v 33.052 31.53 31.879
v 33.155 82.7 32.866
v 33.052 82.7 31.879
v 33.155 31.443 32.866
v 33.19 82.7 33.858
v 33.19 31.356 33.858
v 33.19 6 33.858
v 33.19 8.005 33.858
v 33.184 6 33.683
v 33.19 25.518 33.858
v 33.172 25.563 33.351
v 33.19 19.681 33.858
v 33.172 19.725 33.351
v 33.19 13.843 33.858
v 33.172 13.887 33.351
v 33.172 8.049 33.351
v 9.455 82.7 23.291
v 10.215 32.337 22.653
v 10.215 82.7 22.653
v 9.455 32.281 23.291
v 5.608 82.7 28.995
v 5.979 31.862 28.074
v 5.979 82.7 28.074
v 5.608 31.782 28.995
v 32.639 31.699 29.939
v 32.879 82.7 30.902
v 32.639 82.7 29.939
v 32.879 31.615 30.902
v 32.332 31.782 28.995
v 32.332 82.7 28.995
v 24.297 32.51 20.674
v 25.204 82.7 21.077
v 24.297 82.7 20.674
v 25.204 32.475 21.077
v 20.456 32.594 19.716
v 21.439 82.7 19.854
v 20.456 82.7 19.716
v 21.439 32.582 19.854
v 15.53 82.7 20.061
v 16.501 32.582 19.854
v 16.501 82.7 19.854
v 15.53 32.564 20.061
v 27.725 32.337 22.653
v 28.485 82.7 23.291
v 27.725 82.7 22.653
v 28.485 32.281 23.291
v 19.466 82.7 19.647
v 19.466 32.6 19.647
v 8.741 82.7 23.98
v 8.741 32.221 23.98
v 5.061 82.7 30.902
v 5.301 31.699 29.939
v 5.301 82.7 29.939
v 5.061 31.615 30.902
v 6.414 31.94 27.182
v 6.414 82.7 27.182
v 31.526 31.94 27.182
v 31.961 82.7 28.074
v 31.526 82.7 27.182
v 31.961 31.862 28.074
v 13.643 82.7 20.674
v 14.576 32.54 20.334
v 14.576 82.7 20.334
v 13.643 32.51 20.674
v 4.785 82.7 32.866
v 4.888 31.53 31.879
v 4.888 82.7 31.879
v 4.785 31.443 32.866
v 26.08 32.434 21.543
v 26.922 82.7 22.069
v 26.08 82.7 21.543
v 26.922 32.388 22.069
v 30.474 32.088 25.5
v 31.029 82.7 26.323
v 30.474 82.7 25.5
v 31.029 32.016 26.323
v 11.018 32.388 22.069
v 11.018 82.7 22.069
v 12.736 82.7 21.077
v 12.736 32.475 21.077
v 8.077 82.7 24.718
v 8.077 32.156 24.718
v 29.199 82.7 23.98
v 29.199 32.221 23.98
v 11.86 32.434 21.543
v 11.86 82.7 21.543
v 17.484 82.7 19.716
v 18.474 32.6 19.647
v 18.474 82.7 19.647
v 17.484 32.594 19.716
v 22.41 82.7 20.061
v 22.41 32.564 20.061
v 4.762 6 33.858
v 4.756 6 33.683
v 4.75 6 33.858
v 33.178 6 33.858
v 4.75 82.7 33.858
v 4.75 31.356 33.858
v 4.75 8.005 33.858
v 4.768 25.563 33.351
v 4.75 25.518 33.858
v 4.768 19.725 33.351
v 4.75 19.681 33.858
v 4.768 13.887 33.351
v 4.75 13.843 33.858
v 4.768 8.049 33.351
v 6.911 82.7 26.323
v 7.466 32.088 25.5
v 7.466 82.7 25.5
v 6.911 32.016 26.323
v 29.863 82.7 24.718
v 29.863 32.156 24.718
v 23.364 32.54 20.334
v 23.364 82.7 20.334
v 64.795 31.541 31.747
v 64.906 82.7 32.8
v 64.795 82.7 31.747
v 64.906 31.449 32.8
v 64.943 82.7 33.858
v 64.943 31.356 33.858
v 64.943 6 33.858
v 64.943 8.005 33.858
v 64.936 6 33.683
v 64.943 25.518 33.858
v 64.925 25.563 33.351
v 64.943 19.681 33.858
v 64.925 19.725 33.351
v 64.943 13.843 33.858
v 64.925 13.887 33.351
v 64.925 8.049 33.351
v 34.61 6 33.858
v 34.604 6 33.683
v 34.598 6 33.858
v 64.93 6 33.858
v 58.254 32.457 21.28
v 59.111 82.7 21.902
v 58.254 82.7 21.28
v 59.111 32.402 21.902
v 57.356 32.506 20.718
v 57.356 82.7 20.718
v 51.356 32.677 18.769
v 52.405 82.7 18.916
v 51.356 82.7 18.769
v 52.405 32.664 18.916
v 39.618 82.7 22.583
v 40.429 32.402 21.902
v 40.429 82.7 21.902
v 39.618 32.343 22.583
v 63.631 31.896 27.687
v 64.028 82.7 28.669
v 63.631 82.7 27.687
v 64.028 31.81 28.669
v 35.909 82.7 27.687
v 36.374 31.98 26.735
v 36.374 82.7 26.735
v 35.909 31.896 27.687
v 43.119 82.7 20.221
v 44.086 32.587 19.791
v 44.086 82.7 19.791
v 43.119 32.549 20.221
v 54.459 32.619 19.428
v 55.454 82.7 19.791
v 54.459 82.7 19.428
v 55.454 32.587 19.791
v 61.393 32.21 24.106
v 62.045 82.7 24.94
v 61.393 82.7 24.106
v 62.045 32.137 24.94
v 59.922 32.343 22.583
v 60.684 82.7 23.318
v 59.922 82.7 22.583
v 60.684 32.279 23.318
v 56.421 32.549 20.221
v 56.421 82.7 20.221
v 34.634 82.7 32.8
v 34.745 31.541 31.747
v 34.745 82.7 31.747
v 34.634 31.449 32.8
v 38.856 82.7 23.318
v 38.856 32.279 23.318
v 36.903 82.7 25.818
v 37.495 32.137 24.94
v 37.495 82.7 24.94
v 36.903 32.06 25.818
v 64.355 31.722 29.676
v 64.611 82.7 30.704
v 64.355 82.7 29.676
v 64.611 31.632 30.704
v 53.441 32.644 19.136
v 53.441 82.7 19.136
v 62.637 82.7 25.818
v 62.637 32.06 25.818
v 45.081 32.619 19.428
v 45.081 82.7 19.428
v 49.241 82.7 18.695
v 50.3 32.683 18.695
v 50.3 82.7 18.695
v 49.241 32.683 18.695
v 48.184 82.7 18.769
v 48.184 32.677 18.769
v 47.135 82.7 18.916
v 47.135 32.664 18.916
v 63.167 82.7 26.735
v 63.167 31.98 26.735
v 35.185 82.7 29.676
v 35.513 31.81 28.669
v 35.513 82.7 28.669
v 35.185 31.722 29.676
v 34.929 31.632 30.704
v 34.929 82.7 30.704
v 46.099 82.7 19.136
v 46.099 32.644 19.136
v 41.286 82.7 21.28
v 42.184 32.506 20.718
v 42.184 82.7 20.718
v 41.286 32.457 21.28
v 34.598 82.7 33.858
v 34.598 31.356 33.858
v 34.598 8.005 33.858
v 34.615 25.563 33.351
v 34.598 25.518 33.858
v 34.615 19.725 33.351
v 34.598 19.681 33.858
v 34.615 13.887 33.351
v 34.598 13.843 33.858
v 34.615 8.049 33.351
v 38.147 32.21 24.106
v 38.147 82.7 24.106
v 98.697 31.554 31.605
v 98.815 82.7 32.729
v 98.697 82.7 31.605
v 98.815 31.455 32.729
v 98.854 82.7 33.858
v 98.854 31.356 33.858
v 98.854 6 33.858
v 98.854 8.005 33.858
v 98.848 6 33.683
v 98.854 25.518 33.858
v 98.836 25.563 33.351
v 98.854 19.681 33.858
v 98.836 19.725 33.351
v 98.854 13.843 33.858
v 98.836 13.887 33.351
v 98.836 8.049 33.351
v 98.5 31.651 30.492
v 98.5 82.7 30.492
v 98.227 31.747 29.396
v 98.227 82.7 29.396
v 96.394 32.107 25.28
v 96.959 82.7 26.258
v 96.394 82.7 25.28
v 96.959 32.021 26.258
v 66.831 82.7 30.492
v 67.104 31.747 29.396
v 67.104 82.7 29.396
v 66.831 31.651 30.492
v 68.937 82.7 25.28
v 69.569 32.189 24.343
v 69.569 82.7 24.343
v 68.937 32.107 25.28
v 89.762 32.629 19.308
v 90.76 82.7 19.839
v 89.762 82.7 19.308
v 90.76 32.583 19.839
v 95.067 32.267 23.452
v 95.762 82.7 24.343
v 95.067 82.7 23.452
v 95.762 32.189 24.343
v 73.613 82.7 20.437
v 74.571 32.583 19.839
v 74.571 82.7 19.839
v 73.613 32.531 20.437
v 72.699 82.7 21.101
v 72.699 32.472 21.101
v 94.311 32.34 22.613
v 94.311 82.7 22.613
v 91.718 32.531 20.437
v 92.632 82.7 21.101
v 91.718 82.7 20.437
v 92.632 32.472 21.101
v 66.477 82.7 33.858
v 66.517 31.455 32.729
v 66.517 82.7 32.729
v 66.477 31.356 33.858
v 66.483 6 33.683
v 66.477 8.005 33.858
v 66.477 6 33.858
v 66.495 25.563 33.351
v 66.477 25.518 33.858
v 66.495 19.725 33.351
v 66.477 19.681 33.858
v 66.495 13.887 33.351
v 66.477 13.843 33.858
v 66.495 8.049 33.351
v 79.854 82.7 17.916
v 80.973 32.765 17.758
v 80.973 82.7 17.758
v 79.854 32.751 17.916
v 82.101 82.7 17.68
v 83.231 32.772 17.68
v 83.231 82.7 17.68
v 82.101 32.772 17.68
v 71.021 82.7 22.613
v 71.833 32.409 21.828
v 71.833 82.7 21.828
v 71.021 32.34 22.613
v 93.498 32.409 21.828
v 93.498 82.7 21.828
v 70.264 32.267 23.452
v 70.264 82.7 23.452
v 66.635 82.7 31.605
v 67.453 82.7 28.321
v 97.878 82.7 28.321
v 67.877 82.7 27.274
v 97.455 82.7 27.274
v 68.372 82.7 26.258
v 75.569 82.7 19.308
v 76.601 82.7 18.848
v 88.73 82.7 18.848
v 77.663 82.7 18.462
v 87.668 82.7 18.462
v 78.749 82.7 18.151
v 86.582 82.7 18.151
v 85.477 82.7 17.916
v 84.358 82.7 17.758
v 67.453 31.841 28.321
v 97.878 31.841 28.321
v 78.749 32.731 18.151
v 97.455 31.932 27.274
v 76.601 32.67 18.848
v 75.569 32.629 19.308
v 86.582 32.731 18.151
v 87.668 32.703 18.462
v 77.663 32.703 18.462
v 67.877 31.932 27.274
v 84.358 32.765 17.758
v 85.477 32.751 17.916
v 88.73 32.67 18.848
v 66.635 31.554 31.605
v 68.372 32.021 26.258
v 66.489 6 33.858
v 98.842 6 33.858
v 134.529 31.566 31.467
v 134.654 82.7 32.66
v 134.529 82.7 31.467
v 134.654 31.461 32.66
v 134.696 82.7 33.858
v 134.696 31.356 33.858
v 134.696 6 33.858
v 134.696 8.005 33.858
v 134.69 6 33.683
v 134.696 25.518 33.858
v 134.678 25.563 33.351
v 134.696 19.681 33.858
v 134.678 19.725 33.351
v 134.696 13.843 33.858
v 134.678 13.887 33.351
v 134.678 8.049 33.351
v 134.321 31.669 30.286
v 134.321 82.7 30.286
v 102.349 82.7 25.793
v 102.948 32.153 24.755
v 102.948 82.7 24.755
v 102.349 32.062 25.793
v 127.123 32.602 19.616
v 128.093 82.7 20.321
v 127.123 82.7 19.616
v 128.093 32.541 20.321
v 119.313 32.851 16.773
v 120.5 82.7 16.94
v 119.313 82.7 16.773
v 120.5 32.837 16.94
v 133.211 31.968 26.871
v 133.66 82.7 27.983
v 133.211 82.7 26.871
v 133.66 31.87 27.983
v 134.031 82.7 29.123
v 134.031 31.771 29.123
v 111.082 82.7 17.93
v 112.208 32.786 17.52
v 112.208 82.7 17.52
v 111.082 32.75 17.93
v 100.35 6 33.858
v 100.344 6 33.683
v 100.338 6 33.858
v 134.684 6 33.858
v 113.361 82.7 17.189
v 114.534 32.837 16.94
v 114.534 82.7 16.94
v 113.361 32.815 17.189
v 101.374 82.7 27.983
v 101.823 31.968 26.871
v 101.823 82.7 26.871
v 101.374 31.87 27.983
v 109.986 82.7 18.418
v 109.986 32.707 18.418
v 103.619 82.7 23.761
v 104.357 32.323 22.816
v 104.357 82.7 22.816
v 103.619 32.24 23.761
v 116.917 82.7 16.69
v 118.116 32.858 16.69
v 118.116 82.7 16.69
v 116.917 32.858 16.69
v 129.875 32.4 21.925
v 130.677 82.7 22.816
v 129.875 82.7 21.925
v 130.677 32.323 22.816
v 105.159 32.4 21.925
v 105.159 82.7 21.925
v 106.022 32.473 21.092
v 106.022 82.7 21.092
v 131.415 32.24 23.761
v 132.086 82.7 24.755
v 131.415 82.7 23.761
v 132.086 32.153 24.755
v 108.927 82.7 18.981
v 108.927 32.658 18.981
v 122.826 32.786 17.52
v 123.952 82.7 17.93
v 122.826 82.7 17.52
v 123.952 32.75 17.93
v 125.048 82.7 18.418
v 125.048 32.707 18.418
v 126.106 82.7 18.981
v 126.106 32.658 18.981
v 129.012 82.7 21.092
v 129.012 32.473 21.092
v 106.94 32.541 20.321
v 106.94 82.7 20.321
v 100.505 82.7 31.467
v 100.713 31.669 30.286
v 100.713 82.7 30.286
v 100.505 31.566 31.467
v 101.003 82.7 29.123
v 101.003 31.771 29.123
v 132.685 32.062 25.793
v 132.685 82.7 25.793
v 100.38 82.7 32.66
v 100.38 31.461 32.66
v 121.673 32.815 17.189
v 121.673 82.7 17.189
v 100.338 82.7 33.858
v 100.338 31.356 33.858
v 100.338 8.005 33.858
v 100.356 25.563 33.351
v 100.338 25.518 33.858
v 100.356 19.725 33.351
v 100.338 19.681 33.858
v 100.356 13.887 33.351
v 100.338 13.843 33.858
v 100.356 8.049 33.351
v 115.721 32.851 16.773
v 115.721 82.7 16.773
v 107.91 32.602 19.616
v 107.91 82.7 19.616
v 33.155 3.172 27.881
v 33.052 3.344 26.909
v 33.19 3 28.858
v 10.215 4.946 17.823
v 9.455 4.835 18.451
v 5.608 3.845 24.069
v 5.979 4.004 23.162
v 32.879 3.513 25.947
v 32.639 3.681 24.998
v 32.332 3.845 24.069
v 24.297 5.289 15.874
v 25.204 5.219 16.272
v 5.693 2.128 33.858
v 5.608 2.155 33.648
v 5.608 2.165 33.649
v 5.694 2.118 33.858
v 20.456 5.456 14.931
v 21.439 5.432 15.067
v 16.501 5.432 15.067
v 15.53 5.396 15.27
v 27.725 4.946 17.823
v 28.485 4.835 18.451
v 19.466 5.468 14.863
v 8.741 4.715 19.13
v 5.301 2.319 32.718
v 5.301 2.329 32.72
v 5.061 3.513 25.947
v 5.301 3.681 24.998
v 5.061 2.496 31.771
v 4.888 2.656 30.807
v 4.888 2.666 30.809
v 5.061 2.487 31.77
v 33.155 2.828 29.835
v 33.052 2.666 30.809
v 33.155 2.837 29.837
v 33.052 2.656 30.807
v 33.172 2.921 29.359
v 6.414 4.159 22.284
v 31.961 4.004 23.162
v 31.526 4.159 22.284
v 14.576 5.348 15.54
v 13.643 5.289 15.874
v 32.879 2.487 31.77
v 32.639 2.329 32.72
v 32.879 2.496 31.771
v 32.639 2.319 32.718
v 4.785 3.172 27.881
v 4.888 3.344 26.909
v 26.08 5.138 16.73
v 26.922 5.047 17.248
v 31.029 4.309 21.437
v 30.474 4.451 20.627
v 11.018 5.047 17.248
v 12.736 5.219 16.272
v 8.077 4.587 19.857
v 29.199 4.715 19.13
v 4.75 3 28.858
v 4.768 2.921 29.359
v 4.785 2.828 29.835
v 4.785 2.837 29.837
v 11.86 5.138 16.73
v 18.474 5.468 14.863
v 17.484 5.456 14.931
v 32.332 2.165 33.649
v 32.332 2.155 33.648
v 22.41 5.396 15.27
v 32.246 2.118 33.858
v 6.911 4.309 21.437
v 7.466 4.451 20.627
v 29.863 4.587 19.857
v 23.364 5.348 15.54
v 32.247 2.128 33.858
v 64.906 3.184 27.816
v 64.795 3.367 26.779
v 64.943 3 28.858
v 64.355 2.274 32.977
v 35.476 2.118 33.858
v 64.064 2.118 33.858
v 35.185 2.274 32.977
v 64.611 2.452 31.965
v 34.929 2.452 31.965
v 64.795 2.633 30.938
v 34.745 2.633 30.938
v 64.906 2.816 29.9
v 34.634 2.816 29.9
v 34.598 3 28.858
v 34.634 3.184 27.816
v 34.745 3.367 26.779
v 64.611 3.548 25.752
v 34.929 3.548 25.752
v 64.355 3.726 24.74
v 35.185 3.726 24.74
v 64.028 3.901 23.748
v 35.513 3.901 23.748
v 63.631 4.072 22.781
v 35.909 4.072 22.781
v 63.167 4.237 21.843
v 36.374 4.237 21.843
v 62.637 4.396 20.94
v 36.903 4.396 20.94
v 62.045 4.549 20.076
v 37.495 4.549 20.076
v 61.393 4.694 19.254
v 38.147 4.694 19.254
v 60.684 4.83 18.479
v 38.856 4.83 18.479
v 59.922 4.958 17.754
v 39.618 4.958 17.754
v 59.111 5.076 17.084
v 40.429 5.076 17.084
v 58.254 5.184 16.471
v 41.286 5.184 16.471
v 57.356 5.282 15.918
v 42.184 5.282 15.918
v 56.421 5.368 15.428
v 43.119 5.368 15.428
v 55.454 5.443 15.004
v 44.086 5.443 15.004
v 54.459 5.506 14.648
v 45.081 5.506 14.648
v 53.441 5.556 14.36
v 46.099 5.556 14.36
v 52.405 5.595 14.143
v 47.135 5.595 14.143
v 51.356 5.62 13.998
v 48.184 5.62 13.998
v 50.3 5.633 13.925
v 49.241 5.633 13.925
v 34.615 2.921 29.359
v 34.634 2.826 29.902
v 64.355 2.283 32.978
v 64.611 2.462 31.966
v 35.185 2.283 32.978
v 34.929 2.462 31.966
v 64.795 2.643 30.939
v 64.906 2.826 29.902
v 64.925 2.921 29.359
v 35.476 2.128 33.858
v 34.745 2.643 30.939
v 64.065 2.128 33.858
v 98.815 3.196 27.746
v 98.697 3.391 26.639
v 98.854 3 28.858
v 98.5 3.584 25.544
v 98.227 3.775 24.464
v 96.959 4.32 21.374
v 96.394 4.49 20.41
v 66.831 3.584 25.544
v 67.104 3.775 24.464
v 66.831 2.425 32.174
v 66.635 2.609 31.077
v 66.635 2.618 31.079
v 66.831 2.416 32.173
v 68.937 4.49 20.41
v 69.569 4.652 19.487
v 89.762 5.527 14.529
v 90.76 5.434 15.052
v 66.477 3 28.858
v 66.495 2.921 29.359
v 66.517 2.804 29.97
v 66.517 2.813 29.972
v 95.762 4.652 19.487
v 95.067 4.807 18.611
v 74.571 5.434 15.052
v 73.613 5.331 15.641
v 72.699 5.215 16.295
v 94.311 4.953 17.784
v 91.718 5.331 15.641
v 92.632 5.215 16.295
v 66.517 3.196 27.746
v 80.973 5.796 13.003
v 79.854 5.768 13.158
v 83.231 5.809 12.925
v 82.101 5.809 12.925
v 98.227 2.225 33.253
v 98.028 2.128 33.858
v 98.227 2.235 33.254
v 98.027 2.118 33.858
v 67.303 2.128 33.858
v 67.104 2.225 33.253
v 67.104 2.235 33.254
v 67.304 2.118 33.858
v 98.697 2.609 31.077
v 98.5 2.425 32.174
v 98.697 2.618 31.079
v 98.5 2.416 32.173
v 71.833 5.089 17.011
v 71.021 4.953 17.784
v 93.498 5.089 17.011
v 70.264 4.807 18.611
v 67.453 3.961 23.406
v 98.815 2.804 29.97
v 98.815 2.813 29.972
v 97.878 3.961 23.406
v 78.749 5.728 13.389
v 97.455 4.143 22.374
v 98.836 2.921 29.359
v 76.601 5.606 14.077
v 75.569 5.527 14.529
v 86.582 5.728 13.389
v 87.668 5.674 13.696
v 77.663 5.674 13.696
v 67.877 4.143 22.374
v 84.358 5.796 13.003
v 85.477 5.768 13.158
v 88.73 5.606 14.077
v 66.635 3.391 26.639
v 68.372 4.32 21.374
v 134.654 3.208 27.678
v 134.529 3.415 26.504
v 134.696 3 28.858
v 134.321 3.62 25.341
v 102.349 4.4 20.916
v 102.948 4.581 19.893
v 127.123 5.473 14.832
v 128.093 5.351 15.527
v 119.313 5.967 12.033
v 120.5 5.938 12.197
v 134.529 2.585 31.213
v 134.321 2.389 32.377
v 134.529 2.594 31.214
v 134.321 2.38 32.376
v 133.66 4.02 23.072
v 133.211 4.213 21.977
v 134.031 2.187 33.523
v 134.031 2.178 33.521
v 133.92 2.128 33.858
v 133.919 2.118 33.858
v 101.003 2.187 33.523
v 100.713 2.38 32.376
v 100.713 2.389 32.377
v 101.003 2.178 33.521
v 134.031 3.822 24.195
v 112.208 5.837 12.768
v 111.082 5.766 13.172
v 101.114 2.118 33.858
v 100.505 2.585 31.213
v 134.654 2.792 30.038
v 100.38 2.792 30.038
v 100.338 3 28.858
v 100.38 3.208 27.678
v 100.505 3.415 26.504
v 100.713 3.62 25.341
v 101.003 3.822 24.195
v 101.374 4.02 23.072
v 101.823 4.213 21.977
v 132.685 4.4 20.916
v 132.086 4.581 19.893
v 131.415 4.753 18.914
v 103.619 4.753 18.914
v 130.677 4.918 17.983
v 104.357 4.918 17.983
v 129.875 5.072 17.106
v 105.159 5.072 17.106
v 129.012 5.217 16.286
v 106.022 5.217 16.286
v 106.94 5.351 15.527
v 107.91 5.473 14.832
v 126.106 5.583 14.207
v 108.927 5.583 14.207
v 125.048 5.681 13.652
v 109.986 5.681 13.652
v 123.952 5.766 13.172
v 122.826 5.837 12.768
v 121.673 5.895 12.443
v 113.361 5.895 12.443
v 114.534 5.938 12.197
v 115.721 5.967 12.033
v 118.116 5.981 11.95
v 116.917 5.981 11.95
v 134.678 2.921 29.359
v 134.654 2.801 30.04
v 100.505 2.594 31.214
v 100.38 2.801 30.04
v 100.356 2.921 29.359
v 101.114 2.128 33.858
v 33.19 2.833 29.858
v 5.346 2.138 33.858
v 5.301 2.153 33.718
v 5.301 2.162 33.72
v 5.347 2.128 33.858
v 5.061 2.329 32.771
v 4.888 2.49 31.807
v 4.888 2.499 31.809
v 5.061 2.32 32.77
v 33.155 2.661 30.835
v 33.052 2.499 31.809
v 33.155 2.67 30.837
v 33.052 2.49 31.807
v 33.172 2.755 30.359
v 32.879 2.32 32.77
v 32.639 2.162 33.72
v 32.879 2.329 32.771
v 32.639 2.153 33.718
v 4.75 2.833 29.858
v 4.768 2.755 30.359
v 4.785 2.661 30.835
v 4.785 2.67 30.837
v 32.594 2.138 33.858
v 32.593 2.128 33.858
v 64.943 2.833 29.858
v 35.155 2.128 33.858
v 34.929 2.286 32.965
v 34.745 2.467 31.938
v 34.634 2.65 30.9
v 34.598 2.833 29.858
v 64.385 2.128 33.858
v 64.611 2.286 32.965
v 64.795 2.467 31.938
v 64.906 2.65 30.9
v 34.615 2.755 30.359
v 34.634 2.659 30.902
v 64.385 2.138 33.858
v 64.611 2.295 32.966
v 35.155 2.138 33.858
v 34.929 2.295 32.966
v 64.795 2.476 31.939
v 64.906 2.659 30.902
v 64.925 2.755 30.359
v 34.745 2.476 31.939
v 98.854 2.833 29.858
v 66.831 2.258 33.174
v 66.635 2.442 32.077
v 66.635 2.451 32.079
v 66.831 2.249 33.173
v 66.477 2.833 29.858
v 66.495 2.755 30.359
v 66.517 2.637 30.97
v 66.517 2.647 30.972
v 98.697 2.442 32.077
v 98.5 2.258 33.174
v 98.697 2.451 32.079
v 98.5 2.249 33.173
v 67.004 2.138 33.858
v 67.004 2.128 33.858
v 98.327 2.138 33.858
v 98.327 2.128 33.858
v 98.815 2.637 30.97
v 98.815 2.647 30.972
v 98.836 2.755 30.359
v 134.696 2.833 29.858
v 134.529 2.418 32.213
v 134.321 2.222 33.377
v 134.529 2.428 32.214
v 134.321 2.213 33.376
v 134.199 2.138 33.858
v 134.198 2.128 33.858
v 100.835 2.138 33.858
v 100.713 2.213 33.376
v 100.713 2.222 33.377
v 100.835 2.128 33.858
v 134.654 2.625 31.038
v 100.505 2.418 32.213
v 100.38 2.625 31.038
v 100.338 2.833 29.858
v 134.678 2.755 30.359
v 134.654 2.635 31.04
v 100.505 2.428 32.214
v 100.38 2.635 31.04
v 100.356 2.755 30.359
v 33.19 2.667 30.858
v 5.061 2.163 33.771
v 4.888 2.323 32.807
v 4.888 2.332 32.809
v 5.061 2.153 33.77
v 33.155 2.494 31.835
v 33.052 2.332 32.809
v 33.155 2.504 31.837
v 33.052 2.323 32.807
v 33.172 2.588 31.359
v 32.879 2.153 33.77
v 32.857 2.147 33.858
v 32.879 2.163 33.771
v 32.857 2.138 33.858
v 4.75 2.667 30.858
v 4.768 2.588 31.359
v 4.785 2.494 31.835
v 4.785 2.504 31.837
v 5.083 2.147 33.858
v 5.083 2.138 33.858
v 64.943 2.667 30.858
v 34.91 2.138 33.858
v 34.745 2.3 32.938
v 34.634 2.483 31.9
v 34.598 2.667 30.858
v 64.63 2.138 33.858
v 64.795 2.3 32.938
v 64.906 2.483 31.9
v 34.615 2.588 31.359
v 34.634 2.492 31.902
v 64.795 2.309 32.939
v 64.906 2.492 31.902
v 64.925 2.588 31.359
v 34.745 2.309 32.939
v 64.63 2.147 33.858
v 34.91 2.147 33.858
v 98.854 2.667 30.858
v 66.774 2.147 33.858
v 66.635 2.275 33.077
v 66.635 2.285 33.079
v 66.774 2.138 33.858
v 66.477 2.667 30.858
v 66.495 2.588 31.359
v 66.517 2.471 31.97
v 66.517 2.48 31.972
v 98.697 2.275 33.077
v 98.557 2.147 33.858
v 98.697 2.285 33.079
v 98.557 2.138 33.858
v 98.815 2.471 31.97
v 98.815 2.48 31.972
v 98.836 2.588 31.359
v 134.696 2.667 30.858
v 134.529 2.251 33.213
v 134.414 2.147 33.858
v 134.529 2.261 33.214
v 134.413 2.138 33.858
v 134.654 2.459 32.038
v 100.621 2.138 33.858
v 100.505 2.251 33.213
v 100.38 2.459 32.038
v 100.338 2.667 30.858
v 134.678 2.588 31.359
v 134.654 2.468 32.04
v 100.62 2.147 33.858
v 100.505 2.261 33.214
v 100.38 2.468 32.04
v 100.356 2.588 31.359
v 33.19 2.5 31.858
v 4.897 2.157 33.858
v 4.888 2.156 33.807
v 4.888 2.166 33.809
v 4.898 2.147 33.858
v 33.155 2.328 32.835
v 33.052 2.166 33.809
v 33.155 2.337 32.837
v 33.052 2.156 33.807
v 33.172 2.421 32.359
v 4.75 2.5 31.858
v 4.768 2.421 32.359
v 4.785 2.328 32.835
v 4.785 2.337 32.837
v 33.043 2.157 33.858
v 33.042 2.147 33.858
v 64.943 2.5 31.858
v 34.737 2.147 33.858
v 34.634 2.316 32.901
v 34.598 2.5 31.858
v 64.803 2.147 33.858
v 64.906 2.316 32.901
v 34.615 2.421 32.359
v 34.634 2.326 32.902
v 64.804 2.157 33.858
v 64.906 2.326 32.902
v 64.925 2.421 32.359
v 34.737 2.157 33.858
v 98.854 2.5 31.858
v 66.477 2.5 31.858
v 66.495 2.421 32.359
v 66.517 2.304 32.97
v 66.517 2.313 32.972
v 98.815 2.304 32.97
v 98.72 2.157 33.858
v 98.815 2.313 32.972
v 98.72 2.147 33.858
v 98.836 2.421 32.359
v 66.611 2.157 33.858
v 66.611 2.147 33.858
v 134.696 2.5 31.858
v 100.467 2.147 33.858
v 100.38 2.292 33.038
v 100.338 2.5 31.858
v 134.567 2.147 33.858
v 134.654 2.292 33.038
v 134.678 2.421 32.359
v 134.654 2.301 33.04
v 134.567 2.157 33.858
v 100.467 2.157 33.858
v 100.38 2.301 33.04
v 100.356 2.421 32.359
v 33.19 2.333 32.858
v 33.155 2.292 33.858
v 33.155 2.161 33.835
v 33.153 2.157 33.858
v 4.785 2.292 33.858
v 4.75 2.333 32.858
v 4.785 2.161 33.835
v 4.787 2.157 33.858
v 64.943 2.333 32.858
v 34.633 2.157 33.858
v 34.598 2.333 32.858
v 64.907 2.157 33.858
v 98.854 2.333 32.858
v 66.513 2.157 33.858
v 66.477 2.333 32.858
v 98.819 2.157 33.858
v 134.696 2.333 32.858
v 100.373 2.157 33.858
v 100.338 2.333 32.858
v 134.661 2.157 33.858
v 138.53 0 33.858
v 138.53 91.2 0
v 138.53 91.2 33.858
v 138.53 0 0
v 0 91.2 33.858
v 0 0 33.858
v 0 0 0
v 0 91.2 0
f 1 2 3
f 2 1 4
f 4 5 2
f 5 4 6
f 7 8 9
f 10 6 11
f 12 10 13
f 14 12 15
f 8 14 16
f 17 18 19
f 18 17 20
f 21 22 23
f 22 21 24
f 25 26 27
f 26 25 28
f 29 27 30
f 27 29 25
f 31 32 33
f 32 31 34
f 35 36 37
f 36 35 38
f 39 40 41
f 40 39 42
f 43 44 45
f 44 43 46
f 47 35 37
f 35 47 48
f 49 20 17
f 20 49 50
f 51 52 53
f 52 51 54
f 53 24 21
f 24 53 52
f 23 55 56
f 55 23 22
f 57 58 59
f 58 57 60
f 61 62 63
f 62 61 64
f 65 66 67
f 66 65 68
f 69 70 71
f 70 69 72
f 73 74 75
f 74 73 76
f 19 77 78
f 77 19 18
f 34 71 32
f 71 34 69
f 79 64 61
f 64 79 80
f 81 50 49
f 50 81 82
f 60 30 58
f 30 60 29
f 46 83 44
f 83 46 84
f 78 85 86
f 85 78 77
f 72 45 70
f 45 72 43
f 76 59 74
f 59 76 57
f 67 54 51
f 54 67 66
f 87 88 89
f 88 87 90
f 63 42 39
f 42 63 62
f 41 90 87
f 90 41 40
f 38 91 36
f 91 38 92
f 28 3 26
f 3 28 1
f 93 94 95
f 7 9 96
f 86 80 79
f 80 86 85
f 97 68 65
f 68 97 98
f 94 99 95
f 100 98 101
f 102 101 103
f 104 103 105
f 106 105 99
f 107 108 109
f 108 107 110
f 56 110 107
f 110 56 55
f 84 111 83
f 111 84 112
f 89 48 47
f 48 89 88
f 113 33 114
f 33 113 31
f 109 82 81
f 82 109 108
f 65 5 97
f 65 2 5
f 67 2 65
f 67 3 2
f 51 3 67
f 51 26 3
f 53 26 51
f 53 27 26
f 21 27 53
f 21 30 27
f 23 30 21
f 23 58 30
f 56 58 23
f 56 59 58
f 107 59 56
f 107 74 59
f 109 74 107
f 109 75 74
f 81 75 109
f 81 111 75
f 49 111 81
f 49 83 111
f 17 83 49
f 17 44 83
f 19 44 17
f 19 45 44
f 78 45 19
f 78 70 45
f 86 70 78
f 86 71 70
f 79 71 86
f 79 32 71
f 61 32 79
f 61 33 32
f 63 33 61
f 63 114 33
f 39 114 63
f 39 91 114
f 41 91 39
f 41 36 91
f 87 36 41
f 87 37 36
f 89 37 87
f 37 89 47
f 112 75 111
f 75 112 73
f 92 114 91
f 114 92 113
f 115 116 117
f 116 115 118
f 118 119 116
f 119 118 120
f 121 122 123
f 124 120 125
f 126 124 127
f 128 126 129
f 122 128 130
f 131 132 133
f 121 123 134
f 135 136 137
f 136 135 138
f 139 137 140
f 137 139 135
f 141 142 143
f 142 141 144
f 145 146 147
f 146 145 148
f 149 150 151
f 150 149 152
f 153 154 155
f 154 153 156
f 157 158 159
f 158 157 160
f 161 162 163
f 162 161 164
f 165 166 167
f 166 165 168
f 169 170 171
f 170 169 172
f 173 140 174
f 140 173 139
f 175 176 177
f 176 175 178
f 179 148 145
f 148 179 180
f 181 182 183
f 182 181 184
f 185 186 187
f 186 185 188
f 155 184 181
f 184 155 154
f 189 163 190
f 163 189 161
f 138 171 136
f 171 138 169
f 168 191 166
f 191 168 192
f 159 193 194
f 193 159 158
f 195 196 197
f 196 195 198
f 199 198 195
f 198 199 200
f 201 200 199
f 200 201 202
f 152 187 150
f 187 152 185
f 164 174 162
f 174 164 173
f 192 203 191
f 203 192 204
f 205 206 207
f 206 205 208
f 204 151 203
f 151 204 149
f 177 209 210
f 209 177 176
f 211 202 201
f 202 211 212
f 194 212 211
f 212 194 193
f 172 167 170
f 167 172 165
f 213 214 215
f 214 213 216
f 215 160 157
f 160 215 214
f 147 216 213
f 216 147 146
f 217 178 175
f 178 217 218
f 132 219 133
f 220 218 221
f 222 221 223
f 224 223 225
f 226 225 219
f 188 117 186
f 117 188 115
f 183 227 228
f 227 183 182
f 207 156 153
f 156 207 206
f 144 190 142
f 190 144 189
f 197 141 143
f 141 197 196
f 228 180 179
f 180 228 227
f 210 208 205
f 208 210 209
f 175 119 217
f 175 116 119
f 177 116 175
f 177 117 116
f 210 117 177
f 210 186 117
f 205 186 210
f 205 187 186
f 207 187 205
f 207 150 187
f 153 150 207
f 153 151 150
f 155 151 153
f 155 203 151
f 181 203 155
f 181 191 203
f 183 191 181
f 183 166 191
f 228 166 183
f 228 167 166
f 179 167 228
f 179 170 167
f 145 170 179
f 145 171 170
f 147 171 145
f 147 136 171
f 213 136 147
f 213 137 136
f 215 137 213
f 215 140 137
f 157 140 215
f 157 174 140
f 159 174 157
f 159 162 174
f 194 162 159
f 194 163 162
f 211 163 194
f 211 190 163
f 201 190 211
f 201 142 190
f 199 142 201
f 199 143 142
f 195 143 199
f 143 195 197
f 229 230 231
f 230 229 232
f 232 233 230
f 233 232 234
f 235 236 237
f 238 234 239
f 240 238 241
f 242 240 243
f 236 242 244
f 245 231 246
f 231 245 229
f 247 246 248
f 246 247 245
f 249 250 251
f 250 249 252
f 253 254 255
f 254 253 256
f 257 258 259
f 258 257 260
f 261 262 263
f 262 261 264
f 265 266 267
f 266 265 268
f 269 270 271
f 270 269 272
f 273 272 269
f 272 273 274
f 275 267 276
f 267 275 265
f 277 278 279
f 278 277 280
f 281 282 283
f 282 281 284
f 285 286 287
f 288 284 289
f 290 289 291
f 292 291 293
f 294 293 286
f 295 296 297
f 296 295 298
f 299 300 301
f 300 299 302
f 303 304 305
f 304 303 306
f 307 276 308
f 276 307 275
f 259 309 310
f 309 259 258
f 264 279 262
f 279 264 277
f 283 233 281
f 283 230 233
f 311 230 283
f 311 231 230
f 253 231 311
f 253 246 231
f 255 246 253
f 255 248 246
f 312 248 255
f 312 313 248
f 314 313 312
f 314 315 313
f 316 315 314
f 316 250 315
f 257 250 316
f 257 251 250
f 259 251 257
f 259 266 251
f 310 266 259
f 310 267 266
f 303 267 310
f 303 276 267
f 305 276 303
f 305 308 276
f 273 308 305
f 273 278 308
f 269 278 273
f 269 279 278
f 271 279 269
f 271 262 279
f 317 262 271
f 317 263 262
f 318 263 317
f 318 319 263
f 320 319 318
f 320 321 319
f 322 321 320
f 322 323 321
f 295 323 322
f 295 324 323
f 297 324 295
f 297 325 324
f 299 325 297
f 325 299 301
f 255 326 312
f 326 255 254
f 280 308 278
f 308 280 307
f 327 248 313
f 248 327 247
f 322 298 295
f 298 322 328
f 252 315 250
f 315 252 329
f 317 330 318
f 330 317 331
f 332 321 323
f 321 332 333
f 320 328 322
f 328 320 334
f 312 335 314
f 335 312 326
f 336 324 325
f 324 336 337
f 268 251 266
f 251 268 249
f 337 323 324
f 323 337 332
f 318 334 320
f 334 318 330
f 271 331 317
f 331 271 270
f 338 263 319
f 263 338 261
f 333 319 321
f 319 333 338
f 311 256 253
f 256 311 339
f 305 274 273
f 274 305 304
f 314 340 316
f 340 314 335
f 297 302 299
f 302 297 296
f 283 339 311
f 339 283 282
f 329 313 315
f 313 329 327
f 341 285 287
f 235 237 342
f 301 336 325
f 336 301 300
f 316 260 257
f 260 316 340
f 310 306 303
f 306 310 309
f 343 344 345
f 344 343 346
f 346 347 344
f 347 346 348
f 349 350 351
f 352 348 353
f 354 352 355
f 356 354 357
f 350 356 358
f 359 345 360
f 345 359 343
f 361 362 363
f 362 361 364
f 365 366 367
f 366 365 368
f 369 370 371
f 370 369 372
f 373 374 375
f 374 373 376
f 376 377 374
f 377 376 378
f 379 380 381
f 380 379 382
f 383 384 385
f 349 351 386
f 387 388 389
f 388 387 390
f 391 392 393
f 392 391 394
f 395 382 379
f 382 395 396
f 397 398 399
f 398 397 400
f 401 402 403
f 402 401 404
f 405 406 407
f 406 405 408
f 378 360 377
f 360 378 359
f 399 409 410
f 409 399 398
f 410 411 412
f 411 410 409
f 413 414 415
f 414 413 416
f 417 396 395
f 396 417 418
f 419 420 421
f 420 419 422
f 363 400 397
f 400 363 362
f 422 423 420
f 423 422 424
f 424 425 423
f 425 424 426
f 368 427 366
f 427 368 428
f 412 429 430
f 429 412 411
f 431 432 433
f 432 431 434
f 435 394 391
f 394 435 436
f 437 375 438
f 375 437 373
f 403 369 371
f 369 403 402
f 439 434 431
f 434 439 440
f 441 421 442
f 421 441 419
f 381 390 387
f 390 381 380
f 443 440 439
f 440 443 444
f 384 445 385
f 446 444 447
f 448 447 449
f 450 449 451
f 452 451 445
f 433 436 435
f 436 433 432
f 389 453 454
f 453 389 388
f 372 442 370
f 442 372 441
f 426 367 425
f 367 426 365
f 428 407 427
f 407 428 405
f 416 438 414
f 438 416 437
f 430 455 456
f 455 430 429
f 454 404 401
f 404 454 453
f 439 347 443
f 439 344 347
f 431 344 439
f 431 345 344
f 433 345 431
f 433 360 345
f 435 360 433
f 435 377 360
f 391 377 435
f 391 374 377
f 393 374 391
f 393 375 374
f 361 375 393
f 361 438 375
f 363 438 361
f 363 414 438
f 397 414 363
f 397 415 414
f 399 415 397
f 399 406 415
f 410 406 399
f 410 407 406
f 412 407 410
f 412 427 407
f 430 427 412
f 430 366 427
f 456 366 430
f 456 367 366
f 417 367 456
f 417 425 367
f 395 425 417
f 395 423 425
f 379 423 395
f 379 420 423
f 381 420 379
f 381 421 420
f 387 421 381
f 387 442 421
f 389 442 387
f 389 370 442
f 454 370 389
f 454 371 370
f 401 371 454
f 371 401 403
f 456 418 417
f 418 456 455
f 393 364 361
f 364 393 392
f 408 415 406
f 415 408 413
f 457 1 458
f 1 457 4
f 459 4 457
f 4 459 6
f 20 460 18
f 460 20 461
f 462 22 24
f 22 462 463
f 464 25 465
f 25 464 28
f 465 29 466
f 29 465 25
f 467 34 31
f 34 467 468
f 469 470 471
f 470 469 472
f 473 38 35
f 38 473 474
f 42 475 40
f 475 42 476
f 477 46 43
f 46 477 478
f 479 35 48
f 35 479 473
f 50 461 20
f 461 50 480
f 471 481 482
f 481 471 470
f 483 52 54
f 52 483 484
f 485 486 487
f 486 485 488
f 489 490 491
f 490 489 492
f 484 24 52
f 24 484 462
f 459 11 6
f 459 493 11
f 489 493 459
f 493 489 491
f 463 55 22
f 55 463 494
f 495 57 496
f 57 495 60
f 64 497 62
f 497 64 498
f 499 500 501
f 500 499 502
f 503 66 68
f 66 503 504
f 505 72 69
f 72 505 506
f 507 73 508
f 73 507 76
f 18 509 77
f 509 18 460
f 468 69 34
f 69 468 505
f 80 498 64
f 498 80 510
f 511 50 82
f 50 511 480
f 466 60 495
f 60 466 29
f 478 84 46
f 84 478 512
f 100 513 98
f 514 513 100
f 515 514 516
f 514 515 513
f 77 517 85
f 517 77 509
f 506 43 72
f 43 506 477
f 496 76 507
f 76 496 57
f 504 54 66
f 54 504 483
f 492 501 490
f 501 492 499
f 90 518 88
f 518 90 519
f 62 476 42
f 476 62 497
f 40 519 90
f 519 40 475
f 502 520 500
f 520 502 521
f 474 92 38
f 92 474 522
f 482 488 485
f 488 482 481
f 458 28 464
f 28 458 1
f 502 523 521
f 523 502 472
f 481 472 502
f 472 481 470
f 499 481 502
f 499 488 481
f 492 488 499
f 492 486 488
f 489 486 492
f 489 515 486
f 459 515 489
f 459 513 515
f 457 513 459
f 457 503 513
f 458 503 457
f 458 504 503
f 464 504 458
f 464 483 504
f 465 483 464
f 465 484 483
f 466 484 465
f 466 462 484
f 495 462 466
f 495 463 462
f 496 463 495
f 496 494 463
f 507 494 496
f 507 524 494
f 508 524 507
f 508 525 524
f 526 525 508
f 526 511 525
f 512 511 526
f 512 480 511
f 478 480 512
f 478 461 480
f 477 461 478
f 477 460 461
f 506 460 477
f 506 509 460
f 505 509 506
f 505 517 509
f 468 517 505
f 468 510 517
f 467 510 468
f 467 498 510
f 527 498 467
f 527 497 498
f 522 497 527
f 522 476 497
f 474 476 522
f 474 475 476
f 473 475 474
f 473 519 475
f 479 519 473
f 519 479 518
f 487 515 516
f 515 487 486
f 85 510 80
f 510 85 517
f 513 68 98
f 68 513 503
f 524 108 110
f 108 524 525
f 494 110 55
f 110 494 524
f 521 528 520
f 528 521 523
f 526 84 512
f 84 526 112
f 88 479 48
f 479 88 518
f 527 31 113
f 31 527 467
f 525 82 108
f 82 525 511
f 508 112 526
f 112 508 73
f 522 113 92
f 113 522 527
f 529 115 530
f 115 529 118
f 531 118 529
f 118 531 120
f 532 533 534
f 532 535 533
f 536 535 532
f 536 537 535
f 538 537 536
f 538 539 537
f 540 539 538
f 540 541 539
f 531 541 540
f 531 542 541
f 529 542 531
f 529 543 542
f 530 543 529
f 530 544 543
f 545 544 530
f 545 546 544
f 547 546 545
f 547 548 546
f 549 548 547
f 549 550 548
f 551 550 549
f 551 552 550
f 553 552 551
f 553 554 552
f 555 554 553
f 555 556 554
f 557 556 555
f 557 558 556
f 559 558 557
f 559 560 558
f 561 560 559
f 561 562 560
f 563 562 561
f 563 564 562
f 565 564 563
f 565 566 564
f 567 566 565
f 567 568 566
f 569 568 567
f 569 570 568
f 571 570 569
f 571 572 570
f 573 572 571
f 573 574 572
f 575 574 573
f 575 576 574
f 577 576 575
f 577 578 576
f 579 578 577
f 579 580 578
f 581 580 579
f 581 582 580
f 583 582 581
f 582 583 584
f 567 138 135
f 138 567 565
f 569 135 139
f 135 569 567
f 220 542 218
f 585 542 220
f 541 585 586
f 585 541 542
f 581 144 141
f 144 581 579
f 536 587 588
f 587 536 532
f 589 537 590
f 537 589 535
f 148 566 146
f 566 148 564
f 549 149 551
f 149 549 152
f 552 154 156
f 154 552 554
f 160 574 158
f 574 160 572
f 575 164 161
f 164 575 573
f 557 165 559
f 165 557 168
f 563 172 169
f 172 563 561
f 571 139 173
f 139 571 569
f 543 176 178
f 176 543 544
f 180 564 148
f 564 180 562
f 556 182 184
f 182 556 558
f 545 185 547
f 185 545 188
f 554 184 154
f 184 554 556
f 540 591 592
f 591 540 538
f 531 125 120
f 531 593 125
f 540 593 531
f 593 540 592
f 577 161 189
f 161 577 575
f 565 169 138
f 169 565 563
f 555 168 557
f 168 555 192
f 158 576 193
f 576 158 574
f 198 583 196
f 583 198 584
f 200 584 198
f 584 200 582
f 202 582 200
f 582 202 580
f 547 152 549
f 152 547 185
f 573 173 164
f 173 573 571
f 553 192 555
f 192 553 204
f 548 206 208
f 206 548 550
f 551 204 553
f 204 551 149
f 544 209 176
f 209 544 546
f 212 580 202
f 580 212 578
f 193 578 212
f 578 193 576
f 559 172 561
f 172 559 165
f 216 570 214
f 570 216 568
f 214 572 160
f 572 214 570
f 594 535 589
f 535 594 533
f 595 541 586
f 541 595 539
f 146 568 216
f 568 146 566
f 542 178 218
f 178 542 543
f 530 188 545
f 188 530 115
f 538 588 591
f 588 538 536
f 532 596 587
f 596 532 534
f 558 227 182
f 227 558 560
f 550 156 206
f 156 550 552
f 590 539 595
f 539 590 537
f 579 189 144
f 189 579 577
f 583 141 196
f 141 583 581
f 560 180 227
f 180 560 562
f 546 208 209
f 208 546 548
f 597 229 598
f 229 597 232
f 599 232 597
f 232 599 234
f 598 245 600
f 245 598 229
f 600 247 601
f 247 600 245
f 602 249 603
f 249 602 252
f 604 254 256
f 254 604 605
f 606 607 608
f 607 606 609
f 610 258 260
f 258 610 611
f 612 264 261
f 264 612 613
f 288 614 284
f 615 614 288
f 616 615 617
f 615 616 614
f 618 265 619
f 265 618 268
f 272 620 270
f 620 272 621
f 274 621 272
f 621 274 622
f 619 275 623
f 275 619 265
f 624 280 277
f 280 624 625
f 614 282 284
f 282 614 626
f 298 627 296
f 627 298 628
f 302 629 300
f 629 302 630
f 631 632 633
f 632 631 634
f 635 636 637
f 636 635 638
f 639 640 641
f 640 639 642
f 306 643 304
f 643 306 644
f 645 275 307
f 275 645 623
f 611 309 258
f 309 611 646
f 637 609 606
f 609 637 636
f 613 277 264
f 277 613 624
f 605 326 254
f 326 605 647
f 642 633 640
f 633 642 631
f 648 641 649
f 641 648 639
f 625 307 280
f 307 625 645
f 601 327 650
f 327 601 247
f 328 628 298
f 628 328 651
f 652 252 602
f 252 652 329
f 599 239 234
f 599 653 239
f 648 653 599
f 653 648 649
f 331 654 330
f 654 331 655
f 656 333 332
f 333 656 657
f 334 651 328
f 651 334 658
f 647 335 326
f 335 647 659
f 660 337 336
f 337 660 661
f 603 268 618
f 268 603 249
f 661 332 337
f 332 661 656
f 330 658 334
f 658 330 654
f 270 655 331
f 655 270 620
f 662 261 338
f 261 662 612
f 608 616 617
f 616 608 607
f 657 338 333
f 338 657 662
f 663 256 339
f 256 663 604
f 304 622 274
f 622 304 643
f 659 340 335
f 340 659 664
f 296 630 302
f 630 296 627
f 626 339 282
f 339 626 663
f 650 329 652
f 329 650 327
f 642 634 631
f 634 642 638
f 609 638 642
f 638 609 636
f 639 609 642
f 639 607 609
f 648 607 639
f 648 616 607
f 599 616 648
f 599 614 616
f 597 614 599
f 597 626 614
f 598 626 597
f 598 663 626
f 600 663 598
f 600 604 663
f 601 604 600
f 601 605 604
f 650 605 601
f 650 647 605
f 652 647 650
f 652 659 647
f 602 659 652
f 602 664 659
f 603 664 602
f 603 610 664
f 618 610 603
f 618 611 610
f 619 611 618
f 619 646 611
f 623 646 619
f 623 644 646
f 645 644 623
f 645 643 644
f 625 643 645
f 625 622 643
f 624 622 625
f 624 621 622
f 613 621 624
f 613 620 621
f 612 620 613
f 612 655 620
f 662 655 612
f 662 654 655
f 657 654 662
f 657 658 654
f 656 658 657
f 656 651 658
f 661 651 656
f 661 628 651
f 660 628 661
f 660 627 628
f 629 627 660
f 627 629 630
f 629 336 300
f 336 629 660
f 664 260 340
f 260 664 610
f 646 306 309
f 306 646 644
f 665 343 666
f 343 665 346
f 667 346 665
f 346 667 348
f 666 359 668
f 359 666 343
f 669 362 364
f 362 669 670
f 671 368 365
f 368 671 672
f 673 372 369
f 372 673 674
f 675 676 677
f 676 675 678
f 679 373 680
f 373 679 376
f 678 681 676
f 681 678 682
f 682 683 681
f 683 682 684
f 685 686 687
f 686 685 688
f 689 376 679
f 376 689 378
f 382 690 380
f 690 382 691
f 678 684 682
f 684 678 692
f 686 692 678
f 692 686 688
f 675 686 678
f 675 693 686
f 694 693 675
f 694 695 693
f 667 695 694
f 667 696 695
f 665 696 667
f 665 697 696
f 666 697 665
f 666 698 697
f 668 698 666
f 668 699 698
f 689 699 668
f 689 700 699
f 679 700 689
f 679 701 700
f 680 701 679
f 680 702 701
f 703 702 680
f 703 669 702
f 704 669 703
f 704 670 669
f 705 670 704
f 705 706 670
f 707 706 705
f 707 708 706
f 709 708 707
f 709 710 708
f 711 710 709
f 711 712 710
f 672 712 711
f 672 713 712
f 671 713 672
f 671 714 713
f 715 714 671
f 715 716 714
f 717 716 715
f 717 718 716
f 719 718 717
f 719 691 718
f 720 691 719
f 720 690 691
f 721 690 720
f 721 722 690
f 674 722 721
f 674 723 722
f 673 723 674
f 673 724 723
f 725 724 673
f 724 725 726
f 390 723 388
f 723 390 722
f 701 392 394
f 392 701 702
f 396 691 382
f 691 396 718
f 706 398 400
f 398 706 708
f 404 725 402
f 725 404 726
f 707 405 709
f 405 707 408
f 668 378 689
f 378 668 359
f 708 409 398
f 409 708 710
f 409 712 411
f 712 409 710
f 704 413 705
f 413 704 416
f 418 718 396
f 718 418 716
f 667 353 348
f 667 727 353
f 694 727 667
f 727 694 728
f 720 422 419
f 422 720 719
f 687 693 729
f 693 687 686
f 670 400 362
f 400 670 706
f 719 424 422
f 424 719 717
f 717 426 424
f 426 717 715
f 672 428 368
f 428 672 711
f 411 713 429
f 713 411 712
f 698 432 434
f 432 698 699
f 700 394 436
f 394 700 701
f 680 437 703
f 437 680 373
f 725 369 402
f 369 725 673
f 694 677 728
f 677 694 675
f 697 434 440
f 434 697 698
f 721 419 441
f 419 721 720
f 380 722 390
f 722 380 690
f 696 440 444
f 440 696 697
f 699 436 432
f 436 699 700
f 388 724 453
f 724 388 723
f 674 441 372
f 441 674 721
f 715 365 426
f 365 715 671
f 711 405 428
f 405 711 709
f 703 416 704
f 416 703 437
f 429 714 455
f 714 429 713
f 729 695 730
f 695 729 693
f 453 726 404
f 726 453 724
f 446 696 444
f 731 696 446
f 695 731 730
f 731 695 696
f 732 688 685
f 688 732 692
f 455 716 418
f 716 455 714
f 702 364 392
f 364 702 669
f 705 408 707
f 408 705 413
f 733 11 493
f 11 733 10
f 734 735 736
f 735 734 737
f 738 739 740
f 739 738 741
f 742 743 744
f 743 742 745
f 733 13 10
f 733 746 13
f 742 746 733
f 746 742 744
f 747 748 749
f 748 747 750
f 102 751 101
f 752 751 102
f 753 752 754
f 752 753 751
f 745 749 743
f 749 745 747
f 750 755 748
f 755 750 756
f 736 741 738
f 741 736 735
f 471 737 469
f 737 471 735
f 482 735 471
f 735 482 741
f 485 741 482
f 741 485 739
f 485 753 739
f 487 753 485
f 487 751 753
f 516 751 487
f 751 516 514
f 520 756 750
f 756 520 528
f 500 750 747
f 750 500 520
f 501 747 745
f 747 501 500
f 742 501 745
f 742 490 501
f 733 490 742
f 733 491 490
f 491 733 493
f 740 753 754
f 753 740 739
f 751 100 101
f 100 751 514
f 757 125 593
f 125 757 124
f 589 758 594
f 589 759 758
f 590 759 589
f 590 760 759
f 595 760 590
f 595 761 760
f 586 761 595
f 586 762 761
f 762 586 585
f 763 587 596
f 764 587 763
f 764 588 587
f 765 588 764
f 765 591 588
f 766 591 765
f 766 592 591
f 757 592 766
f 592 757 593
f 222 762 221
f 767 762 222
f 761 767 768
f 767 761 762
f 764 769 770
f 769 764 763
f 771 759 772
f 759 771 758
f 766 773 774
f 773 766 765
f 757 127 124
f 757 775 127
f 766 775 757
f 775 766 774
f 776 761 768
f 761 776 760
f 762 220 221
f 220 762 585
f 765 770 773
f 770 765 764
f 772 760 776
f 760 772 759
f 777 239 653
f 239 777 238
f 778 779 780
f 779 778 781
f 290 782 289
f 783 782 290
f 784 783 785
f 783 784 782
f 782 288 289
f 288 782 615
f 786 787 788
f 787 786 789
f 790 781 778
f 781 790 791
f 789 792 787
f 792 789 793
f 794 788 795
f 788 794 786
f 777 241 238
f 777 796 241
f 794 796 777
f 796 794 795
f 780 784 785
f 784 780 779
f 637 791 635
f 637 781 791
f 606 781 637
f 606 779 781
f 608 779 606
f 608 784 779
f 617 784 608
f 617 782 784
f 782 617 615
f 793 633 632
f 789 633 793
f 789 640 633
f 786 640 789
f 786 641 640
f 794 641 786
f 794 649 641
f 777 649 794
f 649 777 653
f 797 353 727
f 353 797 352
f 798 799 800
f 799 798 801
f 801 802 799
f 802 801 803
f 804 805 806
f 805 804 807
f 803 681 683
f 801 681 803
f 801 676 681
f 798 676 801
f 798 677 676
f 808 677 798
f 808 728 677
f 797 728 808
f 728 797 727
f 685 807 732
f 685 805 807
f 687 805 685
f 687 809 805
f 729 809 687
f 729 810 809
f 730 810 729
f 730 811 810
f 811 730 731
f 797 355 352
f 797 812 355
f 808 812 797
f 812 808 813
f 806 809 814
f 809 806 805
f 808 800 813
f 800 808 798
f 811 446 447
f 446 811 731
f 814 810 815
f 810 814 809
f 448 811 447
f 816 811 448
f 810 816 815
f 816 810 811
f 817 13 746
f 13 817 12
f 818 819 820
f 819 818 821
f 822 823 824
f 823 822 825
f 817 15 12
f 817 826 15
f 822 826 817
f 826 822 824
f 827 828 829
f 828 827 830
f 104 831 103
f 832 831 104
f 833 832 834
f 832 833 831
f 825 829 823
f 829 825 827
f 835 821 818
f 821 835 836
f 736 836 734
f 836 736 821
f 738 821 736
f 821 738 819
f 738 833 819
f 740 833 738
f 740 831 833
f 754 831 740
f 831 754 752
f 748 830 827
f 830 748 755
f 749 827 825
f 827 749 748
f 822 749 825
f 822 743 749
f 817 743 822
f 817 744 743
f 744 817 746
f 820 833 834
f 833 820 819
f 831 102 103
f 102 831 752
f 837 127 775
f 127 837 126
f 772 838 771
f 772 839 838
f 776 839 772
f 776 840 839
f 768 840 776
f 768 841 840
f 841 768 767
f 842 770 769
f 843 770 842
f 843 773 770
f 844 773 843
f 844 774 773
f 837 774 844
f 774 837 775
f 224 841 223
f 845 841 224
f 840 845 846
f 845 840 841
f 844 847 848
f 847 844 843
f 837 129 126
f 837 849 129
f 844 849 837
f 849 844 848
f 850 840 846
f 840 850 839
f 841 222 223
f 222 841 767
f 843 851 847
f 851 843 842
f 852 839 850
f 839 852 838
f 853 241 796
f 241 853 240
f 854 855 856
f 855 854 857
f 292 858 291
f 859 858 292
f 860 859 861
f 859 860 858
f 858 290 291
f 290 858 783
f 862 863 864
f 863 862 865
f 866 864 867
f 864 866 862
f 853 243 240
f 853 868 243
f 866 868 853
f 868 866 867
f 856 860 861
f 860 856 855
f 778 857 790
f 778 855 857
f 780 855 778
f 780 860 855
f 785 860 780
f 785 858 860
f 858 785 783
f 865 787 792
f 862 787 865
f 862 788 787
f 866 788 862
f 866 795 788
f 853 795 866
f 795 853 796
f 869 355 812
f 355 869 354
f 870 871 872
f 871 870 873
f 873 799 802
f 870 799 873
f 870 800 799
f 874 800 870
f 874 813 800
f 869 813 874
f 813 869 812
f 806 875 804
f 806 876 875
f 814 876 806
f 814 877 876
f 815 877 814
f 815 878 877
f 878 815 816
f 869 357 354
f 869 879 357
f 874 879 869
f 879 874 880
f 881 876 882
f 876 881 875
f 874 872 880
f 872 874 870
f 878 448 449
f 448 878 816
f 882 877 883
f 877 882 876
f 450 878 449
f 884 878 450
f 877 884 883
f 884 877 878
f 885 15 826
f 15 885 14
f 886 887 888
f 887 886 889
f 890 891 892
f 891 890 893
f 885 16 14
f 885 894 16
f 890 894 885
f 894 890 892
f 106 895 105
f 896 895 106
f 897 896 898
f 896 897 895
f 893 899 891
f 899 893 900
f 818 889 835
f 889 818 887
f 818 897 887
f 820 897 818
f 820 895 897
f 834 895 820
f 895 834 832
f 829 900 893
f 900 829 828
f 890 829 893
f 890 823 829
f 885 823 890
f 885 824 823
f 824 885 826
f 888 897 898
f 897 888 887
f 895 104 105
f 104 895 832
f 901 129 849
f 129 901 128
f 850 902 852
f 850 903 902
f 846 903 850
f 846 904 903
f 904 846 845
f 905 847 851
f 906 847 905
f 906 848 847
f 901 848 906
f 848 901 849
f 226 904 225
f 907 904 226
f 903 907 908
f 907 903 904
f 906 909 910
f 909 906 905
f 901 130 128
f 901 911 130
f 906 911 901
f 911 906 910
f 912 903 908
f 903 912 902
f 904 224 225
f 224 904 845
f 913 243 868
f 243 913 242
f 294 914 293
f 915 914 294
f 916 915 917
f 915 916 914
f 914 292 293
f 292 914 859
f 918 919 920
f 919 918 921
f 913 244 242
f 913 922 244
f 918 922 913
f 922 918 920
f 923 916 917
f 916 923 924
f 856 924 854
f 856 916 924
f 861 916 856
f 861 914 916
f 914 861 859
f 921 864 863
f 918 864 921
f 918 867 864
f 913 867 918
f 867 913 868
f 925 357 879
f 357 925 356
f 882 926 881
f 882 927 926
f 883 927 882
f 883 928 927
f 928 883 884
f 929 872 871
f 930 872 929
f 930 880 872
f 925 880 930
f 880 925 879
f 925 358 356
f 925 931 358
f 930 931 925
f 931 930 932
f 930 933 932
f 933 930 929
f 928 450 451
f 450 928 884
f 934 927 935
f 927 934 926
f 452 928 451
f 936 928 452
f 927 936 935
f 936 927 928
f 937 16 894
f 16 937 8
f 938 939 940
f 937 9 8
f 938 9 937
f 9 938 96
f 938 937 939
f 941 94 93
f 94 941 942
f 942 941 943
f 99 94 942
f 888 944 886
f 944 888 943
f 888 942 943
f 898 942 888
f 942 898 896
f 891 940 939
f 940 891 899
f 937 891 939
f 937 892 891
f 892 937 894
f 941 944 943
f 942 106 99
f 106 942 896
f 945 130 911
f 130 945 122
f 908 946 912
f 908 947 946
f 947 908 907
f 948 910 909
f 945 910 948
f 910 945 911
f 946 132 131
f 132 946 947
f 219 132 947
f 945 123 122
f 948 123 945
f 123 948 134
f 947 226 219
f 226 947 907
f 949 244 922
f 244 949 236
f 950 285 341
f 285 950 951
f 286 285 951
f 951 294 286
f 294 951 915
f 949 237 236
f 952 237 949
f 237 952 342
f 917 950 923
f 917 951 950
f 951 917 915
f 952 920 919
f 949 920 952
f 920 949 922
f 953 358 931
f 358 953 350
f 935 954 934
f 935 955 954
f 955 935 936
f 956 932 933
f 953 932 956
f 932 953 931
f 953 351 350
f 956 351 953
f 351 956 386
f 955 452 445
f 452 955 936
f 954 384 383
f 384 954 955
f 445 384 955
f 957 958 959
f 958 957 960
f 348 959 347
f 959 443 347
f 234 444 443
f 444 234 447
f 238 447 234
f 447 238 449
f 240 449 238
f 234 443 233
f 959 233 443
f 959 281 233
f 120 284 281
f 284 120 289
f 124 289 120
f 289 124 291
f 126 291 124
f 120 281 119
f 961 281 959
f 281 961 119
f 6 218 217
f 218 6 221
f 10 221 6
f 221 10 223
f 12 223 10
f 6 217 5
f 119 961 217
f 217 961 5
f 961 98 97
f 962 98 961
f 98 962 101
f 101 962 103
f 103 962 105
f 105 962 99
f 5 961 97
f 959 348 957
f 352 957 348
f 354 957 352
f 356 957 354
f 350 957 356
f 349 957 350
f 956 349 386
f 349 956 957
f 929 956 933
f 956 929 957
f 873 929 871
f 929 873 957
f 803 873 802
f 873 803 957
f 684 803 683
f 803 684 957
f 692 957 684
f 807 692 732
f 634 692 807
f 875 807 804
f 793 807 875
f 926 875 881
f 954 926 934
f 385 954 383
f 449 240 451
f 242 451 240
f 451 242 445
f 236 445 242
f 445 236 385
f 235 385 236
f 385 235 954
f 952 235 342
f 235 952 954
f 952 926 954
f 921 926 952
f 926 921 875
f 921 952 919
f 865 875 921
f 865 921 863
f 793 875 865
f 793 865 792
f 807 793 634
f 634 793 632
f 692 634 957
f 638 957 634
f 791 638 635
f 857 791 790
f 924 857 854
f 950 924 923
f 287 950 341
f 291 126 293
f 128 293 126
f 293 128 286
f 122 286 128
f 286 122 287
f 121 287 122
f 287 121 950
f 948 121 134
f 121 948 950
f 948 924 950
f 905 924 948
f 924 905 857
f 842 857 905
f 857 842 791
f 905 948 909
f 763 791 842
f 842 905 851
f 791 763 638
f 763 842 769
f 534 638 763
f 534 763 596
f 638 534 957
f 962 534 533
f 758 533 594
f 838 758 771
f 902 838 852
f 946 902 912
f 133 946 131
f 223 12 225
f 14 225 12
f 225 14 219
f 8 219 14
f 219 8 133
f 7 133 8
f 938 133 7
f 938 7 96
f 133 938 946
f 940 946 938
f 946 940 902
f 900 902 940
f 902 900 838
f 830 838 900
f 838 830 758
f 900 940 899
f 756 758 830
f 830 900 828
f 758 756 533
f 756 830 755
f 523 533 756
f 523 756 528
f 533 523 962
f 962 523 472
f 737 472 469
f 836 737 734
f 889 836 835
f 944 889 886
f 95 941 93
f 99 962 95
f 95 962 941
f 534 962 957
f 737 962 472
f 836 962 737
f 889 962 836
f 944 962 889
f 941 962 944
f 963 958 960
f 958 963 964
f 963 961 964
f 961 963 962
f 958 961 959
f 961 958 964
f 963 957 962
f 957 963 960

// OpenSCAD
offset = .0001;

socketList = [
[3,1.1],    //1/2 drive     13/16 inch
[3,1.175],  //1/2 drive     7/8 inch
[3,1.255],  //1/2 drive     15/16 inch
[3,1.333] //1/2 drive     1 inch
];
function inchToMM(x) = x*25.4;

function sum(v, i=0, r=0) = i < len(v) ? SUM(v, i+1, r+v[i]) :r;

function sumVec(v, i=0, r=0, index=0) = i < len(v) ? sumVec(v, i+1, r+v[i][index], index) :r;

function maxVec(v, i=0, index=0) = i < len(v)?
    v[i][index] > maxVec(v, i+1, index)? v[i][index]: maxVec(v, i+1,index):0;
    

module Sockets(socketSizes, inch = true){

module Socket(length,diameter, inch = true){
    if(inch){
    cylinder(inchToMM(length)+0.5,d = inchToMM(diameter)+0.5, $fn=90);
    }
    else{
    cylinder(length+0.5,d=diameter+0.5, $fn=90);
    }
    
}


function offsetTotal(set, a) = a==0 ? 0 : set[a][1] + offsetTotal(set,a-1)+offset;
    
for(a = [0 : len(socketSizes) - 1 ])
{
    if(inch){
        translate([inchToMM((socketSizes[a][1]/2)+offsetTotal(socketSizes,a))+5,0,0]){
            Socket(socketSizes[a][0],socketSizes[a][1]);
        }
    }
    else{
        translate([(socketSizes[a][1]/2)+offsetTotal(socketSizes,a)+5,0,0]){
            Socket(socketSizes[a][0],socketSizes[a][1]);
        }
    }
}

}


TotalWidth = sumVec(socketList, index = 1)+offset*len(socketList);
MaxLength = maxVec(socketList, index = 0);
MaxThickness = maxVec(socketList, index =1);

echo(TotalWidth);
echo(MaxLength);
echo(MaxThickness);
difference(){
cube(size = [inchToMM(TotalWidth)+15, inchToMM(MaxLength) +15, inchToMM(MaxThickness)]);
translate([0,6,inchToMM(MaxThickness)]){
rotate([-90,0,0])
{
    Sockets(socketList);
    }
}
for(a=[0:4]){
translate([0,-a/6,a]){
translate([0,3,inchToMM(MaxThickness)-5]){
    rotate([-80,0,0])
    {
    Sockets(socketList);
    }
}
}
}
}
